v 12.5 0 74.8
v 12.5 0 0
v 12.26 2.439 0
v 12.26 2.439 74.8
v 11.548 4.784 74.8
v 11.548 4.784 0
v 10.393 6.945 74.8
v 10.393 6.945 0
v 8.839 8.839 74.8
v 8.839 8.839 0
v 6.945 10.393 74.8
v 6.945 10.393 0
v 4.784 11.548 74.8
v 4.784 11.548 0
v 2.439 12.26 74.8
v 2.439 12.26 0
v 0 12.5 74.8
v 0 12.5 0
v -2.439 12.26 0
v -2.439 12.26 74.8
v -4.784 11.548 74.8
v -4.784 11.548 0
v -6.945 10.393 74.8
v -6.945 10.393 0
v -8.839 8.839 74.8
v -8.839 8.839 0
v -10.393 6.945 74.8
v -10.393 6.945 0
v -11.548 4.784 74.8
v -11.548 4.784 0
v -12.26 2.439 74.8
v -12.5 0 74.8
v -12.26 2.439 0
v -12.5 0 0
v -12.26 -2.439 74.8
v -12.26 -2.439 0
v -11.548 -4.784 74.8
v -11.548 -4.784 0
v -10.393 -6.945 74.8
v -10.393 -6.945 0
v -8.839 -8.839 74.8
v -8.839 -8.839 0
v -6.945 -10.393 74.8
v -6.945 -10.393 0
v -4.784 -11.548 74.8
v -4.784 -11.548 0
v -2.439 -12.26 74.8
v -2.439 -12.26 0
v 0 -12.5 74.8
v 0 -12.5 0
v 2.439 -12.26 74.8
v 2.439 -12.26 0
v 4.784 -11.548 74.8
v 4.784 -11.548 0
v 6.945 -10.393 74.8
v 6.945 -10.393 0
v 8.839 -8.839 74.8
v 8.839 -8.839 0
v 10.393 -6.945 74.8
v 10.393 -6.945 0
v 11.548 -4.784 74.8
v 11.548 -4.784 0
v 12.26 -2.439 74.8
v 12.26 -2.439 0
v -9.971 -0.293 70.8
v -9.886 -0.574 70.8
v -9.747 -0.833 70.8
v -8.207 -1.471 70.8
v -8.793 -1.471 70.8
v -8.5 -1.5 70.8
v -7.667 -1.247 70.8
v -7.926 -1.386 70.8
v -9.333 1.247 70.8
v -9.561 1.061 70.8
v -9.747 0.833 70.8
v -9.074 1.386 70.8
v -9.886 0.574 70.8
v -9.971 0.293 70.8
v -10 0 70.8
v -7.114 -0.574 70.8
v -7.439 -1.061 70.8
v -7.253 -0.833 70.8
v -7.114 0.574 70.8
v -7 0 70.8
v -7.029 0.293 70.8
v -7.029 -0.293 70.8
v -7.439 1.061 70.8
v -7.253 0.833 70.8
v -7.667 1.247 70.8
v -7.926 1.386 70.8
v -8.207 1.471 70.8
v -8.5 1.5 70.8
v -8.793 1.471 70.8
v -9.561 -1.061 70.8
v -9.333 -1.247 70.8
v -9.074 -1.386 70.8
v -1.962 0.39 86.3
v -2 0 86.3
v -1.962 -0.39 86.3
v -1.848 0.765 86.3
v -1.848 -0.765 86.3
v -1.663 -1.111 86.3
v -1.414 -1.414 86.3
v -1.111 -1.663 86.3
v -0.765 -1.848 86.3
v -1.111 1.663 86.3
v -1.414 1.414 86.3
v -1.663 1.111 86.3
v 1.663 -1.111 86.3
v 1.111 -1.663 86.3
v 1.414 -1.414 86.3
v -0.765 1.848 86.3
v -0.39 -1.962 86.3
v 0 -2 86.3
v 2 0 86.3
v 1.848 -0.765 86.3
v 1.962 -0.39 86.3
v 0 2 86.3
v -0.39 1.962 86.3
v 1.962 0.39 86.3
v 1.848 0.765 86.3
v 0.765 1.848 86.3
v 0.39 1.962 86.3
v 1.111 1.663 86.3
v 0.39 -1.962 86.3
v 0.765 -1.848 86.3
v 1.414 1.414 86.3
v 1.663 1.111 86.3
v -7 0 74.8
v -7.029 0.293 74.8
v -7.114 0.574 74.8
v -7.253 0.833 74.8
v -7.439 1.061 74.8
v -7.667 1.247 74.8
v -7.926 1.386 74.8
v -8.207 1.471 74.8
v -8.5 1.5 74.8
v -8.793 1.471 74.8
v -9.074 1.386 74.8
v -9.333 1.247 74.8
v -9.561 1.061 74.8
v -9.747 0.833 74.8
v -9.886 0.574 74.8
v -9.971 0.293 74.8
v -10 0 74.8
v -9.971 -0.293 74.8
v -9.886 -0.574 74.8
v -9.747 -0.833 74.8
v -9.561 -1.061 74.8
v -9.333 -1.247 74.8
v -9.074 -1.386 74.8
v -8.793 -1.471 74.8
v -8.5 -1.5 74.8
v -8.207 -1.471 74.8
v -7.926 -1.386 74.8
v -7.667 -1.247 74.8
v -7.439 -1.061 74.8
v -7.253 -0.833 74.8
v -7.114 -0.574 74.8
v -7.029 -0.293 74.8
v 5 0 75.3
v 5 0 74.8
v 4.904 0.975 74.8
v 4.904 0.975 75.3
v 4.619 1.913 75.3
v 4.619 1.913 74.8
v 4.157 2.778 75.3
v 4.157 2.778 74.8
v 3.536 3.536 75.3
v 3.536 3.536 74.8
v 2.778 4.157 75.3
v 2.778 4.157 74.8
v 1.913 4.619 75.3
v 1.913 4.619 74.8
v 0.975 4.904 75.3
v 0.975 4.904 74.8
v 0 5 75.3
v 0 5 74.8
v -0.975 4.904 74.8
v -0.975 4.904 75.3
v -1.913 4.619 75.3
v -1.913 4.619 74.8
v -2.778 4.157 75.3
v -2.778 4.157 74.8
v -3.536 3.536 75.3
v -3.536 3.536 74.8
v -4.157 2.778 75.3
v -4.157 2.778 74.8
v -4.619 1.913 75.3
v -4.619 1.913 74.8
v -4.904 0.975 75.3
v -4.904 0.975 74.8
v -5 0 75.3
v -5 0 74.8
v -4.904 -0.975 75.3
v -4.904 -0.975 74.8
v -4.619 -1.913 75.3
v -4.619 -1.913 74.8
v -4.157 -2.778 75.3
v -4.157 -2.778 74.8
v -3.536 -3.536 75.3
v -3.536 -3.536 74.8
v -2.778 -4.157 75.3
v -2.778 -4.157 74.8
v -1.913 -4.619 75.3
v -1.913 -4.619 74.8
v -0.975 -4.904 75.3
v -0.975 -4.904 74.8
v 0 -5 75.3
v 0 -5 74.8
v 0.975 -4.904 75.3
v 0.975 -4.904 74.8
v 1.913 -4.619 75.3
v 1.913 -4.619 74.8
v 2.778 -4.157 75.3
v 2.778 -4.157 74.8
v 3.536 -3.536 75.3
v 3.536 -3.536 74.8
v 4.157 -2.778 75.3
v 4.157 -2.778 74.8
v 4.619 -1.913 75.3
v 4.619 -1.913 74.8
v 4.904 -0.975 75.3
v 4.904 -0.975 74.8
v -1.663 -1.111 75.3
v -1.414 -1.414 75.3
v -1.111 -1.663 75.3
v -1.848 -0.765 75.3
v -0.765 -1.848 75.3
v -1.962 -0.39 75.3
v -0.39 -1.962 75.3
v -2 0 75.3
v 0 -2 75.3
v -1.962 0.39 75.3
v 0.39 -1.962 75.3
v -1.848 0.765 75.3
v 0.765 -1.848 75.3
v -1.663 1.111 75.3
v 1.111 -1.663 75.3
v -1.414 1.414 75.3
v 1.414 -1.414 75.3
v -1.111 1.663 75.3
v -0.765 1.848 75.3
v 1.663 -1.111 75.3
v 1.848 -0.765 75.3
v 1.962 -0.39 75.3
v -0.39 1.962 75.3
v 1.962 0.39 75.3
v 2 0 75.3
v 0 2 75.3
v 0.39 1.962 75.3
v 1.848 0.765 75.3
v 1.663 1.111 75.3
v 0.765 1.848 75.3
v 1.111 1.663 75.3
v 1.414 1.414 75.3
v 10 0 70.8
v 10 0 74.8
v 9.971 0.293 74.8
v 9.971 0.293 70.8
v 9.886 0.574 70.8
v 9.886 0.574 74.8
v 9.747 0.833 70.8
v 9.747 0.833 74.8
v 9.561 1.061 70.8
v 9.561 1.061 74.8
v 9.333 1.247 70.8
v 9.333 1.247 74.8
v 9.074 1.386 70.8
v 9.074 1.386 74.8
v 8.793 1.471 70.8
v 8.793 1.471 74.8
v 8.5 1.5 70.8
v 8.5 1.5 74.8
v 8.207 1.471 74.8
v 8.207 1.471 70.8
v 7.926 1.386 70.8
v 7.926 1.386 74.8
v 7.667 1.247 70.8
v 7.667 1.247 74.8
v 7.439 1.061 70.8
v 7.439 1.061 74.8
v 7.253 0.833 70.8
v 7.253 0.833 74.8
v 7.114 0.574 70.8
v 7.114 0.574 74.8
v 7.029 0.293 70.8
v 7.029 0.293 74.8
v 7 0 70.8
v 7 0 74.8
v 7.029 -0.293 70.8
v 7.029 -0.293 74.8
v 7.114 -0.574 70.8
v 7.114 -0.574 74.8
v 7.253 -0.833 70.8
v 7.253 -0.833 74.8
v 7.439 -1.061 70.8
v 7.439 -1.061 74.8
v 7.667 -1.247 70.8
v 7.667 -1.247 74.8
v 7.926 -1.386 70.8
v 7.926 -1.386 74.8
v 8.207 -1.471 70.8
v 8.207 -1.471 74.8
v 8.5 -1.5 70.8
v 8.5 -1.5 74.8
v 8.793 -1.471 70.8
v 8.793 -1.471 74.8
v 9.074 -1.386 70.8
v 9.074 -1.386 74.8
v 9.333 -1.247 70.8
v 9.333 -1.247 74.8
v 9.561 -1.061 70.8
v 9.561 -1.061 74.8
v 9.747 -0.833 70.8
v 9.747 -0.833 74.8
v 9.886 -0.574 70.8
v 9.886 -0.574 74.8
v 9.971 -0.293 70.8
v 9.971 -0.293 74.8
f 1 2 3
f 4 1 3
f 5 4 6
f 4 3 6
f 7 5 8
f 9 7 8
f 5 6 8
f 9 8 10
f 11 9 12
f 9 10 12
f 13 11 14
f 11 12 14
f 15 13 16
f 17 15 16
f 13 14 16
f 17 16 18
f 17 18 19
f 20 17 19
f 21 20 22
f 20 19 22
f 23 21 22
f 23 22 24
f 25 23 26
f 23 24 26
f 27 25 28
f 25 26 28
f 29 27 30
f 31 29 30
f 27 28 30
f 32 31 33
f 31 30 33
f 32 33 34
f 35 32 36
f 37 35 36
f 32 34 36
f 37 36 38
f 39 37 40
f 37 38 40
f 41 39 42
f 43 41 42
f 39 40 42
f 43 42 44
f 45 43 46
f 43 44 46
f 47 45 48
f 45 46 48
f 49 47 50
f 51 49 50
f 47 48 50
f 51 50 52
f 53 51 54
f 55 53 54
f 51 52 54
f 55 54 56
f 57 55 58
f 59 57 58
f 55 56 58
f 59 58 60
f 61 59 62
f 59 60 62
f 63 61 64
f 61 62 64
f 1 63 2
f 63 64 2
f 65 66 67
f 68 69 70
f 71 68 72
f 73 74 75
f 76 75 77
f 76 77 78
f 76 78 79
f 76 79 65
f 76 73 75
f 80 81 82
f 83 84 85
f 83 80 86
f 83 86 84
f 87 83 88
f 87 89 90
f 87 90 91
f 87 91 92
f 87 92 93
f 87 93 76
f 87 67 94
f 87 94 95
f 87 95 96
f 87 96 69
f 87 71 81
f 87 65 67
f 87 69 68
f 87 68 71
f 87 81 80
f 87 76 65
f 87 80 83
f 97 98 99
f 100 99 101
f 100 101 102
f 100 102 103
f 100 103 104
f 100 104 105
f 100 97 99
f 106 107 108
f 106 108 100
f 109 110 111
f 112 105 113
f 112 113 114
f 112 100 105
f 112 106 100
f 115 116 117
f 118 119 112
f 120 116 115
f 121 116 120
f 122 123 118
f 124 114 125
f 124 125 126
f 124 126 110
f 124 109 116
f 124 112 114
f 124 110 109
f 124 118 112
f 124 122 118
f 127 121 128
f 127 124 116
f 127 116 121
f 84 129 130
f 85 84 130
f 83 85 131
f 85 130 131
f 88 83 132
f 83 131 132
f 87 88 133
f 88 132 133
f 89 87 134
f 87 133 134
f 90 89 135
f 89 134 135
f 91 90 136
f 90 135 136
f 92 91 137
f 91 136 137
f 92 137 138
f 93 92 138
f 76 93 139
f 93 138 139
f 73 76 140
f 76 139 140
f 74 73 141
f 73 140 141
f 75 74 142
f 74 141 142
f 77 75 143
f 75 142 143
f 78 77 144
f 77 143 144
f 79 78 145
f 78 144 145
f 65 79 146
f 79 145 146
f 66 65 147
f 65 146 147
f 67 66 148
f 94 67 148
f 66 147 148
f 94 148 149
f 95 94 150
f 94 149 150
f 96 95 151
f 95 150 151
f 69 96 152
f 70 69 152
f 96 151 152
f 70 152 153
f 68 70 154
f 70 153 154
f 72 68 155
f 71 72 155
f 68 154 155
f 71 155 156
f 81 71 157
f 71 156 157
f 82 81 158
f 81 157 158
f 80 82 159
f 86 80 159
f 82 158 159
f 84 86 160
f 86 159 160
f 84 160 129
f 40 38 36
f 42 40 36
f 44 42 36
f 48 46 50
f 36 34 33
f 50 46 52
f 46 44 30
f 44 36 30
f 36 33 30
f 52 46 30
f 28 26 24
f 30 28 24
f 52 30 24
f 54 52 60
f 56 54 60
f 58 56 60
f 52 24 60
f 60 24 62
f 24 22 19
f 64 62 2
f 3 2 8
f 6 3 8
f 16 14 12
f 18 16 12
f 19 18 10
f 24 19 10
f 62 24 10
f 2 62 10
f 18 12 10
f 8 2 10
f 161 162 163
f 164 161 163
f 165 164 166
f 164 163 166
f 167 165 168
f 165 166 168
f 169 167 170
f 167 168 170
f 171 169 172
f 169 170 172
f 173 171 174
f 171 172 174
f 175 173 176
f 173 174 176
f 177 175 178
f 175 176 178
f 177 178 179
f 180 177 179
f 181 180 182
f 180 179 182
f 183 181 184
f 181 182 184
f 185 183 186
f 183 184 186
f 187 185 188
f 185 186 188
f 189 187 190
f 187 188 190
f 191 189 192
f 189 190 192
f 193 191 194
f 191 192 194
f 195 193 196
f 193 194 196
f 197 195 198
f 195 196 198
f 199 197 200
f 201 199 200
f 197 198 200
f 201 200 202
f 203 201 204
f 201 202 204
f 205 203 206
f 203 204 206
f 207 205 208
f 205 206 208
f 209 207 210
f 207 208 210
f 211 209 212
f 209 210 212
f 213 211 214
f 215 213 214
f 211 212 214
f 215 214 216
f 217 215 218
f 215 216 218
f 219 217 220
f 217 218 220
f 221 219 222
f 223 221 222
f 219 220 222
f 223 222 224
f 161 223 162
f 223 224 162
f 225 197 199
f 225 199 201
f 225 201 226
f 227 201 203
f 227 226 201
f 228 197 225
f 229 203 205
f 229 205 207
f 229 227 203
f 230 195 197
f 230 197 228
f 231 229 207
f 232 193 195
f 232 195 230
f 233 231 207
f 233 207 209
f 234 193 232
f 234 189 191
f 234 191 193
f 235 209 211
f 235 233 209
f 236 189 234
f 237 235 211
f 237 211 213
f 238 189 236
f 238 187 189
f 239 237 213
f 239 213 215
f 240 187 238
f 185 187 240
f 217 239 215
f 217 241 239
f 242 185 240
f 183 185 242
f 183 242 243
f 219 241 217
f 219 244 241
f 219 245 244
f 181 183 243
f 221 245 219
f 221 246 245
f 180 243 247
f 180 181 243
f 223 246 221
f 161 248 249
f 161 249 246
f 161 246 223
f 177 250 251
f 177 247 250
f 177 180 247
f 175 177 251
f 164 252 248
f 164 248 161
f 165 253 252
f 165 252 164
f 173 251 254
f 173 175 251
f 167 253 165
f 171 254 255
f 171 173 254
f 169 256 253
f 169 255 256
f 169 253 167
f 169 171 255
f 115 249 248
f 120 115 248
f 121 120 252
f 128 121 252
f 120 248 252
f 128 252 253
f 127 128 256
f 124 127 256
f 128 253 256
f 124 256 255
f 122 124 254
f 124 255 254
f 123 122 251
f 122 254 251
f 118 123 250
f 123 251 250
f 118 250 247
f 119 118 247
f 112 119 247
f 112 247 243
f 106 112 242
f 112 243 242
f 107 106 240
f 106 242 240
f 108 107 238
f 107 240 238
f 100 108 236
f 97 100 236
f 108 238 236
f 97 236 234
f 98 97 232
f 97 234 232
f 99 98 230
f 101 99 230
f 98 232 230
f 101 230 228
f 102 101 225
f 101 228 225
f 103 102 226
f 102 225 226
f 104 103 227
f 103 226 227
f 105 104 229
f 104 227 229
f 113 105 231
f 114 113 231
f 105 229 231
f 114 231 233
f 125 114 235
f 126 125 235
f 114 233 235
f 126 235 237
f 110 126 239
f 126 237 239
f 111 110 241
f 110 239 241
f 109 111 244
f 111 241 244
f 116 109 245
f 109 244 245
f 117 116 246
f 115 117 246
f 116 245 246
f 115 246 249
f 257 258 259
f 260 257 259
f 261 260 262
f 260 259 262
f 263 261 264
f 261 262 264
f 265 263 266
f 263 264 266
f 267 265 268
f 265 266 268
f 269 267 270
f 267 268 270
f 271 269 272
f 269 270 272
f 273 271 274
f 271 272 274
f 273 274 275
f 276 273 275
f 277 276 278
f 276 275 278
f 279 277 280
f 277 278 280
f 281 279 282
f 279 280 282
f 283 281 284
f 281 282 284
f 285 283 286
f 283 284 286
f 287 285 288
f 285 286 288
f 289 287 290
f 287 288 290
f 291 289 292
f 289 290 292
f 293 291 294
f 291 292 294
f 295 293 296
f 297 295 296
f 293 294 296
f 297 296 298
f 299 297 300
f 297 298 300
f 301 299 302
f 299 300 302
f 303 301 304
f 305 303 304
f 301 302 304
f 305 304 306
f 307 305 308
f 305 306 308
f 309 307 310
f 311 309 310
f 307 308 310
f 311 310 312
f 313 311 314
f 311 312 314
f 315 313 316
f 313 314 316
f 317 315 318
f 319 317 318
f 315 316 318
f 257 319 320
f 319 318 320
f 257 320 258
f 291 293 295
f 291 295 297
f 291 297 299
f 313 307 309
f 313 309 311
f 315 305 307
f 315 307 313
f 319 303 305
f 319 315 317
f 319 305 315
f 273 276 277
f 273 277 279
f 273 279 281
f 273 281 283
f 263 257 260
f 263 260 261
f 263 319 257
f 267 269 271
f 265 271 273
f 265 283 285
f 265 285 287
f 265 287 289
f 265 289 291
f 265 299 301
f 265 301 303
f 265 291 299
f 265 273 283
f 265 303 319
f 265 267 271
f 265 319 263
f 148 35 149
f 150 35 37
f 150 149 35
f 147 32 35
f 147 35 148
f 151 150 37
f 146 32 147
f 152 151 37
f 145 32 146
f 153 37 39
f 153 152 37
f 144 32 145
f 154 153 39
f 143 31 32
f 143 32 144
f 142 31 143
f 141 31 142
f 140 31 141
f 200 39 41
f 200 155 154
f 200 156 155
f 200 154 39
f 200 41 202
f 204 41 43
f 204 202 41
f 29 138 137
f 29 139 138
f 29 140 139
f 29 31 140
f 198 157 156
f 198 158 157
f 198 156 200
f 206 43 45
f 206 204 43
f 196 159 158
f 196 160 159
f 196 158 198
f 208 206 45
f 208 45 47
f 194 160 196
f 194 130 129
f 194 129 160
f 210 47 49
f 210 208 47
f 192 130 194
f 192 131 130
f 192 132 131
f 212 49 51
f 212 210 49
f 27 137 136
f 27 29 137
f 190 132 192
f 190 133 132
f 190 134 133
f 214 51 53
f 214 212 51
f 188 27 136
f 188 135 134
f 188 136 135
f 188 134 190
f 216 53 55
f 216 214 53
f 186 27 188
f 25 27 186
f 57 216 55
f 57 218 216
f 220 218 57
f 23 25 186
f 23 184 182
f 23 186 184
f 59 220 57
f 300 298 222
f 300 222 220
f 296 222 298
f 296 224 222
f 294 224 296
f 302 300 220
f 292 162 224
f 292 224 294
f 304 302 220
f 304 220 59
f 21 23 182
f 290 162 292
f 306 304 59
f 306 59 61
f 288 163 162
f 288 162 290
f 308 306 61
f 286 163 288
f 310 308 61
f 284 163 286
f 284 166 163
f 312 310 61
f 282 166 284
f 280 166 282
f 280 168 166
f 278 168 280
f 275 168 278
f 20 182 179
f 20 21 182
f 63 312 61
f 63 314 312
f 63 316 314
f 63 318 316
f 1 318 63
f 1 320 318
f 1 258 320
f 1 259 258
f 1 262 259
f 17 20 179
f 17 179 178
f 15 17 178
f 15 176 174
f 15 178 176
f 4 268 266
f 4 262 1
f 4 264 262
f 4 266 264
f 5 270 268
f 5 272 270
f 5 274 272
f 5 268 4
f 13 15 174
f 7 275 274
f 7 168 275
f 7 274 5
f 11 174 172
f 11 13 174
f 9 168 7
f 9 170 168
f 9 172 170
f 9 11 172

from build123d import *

# Parameters (mm, degrees)
SKETCH3_R           = 12.5
BOSS_EXTRUDE1_DEPTH = 74.8
SKETCH4_R           = 5
BOSS_EXTRUDE2_DEPTH = 0.5
SKETCH5_R           = 2
BOSS_EXTRUDE3_DEPTH = 11
SKETCH6_R           = 1.5
CUT_EXTRUDE1_DEPTH  = 4


with BuildPart() as part:
    # Sketch3 → Boss-Extrude1 (new body)
    with BuildSketch(Plane.XY):
        Circle(SKETCH3_R)
    extrude(amount=BOSS_EXTRUDE1_DEPTH)

    # Sketch4 → Boss-Extrude2 (add)
    with BuildSketch(Plane.XY.offset(74.8)):
        Circle(SKETCH4_R)
    extrude(amount=BOSS_EXTRUDE2_DEPTH)

    # Sketch5 → Boss-Extrude3 (add)
    with BuildSketch(Plane.XY.offset(75.3)):
        Circle(SKETCH5_R)
    extrude(amount=BOSS_EXTRUDE3_DEPTH)

    # Sketch6 → Cut-Extrude1 (cut)
    with BuildSketch(Plane.XY.offset(74.8)):
        with Locations((-8.5, 0)):
            Circle(SKETCH6_R)
        with Locations((8.5, 0)):
            Circle(SKETCH6_R)
    extrude(amount=-CUT_EXTRUDE1_DEPTH, mode=Mode.SUBTRACT)


solid = part.part
